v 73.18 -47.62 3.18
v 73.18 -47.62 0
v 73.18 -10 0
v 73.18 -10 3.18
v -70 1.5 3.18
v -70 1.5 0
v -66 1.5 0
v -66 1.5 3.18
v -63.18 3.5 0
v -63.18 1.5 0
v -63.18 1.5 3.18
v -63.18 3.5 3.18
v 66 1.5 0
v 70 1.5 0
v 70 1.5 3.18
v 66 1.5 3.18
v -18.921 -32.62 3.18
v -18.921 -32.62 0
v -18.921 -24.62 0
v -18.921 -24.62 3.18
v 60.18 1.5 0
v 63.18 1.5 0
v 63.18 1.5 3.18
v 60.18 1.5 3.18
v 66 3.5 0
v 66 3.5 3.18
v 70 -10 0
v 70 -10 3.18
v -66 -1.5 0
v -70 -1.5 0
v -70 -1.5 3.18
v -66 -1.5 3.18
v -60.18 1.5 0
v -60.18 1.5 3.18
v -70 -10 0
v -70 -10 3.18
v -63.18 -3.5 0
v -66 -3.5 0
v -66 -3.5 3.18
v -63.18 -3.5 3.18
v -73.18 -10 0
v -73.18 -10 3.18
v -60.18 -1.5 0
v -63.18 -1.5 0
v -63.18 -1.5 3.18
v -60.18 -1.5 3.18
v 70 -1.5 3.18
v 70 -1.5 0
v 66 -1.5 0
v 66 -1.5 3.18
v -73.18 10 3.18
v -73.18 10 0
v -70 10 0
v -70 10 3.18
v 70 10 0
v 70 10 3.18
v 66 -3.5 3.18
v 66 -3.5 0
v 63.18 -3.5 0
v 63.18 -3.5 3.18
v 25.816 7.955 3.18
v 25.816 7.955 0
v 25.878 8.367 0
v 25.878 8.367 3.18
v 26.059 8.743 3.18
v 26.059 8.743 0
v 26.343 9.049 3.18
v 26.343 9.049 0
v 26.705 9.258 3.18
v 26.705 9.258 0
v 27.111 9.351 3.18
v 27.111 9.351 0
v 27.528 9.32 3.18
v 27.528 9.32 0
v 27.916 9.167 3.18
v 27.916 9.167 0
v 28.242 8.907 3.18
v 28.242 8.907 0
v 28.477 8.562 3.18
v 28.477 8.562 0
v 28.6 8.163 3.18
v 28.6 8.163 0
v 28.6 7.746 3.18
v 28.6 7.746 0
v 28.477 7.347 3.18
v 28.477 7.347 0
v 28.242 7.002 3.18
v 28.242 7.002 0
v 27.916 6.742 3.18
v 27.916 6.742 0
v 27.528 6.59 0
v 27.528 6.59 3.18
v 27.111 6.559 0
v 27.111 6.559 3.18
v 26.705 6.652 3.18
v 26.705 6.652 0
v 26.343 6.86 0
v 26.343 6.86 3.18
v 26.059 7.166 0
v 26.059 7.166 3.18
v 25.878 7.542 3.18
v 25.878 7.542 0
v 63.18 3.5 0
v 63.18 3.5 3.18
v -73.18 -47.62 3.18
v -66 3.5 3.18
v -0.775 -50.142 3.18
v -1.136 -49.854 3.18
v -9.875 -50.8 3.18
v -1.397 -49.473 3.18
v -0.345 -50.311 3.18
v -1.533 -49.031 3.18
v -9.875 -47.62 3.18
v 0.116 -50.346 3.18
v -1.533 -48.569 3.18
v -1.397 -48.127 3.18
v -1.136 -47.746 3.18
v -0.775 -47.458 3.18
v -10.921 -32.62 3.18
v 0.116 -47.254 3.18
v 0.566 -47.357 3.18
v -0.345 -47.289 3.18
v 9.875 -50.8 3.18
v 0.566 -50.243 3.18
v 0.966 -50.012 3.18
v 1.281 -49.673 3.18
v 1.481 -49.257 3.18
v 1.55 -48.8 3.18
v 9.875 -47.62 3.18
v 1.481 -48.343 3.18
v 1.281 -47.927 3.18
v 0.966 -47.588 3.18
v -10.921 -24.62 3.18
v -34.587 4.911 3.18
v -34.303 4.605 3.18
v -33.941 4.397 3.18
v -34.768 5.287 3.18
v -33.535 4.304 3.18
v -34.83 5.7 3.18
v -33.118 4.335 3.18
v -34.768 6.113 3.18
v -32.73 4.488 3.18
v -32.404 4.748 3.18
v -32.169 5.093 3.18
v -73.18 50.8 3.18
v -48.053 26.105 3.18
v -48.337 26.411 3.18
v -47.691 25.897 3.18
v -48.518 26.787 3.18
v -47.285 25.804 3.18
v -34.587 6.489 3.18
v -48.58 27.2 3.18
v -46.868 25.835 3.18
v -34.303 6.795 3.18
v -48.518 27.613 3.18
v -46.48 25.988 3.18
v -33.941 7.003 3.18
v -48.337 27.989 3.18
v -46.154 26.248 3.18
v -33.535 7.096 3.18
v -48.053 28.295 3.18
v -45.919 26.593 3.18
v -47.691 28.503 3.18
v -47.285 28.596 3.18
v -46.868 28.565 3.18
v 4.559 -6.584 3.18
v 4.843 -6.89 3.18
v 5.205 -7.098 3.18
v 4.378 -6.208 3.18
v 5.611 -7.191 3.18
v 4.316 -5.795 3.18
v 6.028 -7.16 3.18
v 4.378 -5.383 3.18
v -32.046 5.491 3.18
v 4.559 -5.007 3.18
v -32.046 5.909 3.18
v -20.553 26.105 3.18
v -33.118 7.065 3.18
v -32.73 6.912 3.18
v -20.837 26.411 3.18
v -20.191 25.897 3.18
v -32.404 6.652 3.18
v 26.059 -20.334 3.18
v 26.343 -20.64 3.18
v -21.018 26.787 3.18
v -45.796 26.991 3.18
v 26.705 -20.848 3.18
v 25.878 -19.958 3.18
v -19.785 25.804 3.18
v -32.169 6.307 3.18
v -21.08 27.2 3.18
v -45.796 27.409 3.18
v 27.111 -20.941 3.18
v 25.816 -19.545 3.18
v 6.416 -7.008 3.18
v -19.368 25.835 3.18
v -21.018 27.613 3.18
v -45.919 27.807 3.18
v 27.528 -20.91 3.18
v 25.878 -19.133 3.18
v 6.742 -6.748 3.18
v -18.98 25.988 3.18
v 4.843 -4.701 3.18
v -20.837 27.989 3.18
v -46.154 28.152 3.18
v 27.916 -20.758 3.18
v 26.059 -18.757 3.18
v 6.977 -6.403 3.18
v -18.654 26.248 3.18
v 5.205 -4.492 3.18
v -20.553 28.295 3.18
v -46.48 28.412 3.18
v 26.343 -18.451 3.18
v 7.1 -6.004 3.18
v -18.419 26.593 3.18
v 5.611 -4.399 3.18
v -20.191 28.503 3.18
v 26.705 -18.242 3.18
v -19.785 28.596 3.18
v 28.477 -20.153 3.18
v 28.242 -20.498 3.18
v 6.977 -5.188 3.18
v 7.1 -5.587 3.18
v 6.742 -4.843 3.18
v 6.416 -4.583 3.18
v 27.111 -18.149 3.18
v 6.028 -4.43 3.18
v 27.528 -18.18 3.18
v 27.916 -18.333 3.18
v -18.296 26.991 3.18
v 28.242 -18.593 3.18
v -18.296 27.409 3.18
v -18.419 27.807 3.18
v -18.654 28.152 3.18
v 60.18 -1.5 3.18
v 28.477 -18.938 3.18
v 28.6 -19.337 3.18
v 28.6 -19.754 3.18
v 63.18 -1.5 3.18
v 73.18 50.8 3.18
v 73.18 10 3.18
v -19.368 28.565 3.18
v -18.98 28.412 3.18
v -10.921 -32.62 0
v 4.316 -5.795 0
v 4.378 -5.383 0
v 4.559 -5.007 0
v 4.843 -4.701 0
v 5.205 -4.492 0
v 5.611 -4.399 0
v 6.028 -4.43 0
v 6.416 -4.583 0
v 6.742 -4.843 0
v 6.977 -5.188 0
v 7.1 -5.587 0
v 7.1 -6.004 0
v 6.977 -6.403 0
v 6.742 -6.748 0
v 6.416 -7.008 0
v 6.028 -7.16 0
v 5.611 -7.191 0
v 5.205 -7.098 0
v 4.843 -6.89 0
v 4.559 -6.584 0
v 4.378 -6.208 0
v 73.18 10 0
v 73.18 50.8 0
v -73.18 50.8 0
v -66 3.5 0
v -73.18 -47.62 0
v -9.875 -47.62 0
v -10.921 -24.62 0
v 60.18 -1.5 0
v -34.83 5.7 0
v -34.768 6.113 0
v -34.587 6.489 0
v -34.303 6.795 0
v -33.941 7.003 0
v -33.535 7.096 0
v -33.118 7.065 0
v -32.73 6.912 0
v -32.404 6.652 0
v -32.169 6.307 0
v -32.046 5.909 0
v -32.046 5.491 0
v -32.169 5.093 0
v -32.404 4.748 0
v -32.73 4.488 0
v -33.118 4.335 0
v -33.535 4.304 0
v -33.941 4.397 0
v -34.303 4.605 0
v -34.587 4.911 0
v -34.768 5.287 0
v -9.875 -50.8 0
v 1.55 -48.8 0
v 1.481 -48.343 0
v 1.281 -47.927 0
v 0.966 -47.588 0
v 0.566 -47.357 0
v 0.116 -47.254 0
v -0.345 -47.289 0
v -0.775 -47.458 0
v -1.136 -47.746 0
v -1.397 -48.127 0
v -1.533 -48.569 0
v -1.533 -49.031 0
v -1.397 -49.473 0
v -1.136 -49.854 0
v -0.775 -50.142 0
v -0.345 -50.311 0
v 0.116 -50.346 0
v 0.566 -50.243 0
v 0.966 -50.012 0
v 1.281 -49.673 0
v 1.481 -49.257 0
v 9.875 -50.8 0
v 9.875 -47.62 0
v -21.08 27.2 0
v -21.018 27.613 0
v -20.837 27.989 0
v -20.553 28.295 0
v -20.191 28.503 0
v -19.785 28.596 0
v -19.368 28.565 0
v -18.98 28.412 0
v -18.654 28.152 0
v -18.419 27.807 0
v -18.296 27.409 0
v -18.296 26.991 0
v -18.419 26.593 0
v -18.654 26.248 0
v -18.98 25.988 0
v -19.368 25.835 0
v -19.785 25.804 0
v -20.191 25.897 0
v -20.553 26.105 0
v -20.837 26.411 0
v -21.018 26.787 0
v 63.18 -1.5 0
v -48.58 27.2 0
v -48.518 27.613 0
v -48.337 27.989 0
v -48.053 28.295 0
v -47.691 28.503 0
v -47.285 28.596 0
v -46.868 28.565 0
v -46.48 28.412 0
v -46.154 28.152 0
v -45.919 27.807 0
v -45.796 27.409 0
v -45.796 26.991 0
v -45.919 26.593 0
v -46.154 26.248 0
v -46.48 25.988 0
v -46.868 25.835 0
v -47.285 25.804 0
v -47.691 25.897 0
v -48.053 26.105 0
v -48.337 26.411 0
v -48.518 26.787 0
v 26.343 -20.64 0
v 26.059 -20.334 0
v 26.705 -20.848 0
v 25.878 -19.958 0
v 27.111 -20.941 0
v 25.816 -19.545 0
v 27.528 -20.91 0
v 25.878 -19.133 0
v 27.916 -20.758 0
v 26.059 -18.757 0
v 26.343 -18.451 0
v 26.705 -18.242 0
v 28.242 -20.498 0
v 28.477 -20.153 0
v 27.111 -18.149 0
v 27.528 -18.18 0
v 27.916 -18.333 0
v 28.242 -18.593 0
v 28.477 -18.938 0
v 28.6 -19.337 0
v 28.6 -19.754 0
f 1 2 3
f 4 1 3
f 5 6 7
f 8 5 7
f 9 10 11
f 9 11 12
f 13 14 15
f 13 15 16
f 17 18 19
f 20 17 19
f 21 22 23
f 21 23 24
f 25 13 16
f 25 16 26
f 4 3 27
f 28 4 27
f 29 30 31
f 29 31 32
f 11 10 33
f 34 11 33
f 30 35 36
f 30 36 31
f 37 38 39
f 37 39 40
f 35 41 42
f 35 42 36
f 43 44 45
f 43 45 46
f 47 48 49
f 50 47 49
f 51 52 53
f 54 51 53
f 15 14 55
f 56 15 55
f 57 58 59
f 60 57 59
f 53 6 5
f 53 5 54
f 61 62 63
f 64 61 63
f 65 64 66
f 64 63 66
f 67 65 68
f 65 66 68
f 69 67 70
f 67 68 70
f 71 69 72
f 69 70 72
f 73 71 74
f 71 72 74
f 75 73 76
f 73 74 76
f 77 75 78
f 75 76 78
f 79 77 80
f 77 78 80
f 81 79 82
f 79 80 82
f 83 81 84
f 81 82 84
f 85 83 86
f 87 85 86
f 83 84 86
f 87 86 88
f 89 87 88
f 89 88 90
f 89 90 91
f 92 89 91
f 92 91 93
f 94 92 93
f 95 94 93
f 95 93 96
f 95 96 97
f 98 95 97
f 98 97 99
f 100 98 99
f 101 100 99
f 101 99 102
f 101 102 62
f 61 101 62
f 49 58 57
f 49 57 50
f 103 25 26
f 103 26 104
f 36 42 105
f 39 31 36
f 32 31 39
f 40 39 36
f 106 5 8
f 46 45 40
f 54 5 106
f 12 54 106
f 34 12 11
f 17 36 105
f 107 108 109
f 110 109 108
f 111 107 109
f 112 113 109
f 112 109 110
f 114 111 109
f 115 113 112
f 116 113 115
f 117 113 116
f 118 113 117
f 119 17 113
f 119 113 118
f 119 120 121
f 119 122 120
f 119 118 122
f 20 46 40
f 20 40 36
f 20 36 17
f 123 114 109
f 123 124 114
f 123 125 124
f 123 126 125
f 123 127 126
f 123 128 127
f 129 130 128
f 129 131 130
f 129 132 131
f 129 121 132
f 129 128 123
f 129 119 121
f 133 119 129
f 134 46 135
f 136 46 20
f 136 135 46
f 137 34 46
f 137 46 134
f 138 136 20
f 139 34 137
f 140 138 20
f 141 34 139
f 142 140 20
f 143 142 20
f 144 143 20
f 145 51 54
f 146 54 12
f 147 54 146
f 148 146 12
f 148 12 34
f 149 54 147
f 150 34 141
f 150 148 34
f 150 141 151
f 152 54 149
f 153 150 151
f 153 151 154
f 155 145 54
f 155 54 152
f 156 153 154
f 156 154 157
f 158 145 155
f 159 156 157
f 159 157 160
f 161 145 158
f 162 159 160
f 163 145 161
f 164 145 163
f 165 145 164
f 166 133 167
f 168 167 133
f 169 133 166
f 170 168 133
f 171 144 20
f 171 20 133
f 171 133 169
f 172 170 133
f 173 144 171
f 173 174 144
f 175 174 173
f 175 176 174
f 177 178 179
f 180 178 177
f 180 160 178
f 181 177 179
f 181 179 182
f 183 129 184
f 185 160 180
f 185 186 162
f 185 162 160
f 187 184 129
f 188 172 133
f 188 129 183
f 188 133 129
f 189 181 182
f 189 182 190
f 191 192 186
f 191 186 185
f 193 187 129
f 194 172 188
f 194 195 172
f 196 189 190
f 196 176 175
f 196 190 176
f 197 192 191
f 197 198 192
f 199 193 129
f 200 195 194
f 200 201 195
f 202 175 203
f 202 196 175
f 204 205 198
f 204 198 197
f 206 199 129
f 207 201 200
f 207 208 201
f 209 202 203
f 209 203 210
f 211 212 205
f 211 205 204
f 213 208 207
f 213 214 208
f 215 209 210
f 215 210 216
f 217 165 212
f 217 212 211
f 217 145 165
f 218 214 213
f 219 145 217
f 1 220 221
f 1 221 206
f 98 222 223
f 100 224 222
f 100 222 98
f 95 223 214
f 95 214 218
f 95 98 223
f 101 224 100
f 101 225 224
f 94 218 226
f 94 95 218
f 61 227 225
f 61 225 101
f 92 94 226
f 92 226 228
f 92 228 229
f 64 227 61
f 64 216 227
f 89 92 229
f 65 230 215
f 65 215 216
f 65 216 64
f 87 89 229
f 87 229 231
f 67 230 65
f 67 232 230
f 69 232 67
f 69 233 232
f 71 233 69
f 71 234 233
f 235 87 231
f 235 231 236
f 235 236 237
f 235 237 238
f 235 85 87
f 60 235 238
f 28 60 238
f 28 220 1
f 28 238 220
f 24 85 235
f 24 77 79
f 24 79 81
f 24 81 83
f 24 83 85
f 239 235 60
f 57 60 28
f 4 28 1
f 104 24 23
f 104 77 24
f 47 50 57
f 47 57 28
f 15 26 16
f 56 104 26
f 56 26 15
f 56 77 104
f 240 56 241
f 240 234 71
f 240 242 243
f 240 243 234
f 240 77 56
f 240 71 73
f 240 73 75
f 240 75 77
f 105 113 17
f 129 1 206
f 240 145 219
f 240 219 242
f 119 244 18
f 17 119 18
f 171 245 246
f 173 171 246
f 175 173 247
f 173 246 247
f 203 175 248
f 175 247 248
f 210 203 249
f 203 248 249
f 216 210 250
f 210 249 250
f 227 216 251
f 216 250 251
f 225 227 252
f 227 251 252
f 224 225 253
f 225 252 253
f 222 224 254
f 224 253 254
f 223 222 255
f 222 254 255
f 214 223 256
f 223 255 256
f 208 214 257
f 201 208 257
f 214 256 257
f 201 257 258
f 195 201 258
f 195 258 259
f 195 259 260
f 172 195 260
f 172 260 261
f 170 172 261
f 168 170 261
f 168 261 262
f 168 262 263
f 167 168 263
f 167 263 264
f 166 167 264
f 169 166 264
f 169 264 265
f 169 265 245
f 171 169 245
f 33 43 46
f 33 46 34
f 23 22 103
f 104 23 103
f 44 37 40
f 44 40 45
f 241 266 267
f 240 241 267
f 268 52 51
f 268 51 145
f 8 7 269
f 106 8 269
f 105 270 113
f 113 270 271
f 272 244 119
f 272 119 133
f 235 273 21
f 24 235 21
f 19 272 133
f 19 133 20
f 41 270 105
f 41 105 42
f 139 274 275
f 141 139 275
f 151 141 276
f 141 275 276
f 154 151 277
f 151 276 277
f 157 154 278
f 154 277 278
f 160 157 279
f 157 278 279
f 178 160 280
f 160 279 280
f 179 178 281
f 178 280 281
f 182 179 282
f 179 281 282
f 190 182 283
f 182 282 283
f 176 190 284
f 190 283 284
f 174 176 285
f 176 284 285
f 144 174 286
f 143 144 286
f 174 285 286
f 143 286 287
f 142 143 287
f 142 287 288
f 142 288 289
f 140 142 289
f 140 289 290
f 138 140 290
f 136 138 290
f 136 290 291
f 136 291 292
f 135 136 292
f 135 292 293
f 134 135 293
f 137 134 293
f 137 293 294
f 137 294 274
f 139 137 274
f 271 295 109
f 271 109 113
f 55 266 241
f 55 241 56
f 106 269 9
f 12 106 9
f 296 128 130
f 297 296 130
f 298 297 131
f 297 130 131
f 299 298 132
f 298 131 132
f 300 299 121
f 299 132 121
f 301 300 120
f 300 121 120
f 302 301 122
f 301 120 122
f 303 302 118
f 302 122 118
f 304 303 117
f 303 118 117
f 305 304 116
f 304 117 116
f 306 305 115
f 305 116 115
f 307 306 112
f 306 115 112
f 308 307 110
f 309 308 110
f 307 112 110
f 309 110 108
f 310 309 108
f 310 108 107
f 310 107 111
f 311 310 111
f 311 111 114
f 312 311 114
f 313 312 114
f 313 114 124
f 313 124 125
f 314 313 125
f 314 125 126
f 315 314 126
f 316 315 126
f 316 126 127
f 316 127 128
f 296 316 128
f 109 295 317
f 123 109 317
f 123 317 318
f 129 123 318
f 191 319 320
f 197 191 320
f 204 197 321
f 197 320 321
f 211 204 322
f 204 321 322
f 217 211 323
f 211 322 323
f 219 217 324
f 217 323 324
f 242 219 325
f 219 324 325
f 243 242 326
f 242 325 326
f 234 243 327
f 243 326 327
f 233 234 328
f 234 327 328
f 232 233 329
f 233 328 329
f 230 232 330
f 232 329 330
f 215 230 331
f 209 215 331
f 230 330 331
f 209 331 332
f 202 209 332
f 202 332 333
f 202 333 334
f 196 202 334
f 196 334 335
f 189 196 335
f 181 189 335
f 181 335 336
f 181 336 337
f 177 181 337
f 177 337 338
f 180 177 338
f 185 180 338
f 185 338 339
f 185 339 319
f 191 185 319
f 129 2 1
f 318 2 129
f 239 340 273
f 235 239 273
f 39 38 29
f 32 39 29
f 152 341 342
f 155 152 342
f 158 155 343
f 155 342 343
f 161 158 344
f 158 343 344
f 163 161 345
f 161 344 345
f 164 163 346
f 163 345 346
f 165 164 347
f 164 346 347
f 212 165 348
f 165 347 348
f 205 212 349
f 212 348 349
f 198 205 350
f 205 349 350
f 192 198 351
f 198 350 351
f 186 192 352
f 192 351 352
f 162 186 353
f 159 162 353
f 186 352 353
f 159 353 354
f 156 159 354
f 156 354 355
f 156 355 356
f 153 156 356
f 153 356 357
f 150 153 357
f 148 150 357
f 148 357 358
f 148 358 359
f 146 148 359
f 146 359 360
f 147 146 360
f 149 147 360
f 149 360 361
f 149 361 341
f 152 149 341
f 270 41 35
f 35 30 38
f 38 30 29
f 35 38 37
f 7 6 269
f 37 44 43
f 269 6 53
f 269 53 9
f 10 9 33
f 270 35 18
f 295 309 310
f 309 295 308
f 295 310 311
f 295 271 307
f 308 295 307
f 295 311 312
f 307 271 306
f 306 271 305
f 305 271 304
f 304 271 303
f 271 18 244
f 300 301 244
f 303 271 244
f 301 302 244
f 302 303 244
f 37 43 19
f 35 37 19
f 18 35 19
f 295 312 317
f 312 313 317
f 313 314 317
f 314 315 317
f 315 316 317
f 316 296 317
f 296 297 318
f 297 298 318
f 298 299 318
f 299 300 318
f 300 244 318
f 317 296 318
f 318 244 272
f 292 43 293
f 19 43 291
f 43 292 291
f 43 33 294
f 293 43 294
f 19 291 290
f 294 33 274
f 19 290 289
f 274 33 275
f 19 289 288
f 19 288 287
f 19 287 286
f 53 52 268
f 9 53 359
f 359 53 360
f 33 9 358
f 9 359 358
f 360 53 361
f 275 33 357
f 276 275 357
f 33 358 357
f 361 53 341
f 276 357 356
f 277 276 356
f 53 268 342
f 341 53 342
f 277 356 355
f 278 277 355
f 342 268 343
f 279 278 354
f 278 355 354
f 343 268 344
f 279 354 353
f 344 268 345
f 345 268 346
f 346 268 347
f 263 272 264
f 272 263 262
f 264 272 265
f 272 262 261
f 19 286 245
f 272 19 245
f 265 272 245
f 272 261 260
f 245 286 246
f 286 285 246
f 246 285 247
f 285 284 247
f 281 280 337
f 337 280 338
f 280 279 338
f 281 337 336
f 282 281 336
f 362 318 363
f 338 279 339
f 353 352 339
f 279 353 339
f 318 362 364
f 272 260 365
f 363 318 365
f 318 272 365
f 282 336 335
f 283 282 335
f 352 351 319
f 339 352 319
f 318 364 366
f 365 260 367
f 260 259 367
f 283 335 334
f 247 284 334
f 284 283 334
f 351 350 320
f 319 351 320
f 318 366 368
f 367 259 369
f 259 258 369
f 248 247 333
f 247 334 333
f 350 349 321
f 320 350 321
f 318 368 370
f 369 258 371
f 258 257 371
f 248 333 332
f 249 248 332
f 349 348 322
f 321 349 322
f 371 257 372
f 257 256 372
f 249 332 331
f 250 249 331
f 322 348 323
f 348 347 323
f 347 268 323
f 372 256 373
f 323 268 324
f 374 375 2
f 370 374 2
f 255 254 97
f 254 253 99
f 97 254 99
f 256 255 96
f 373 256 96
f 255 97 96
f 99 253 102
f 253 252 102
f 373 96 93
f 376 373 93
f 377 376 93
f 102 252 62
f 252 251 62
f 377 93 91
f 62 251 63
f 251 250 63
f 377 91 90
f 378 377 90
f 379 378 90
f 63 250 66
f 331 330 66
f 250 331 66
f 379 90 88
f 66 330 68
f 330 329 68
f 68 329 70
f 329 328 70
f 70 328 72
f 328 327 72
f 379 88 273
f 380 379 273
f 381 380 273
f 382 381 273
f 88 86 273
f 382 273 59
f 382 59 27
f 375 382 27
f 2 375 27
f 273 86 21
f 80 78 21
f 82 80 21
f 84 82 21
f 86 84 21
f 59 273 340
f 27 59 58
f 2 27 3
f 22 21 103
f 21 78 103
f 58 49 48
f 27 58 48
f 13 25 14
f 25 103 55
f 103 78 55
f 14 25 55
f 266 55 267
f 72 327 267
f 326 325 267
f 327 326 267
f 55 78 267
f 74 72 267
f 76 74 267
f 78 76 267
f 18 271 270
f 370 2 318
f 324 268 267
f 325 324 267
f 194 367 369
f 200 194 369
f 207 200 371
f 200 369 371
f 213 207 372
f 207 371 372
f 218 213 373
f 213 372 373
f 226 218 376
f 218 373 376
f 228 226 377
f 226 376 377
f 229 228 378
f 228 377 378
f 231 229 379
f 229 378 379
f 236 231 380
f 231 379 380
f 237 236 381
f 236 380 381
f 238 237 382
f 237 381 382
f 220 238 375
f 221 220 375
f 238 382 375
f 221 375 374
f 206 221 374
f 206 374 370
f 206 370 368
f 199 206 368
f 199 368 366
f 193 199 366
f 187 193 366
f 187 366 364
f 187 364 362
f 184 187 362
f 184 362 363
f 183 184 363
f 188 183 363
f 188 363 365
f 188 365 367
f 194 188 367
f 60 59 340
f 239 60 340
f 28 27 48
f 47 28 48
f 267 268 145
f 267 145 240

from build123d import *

# Parameters (mm, degrees)
SKETCH1_W               = 146.36
SKETCH1_H               = 101.6
BOSS_EXTRUDE1_DEPTH     = 3.18
CUT_EXTRUDE1_START      = -4.18
SKETCH2_W               = 3.18
SKETCH2_H               = 20
SKETCH2_W_2             = 13
SKETCH2_H_2             = 3
SKETCH2_W_3             = 2.82
SKETCH2_H_3             = 7
CUT_EXTRUDE1_DEPTH      = 5.18
CUT_EXTRUDE2_START      = -4.18
SKETCH3_W               = 63.305
SKETCH3_H               = 3.18
CUT_EXTRUDE2_DEPTH      = 5.18
SKETCH4_R               = 1.55
CUT_EXTRUDE3_DEPTH      = 1
CUT_EXTRUDE3_DEPTH_BACK = 4.18
SKETCH9_W               = 8
SKETCH9_H               = 8
CUT_EXTRUDE7_DEPTH      = 1
CUT_EXTRUDE7_DEPTH_BACK = 4.18
SKETCH8_R               = 1.4
CUT_EXTRUDE8_DEPTH      = 1
CUT_EXTRUDE8_DEPTH_BACK = 4.18
SKETCH12_R              = 1.4
CUT_EXTRUDE9_DEPTH      = 1
CUT_EXTRUDE9_DEPTH_BACK = 4.18


with BuildPart() as part:
    # Sketch1 → Boss-Extrude1 (new body)
    with BuildSketch(Plane.XY):
        Rectangle(SKETCH1_W, SKETCH1_H)
    extrude(amount=BOSS_EXTRUDE1_DEPTH)

    # Sketch2 → Cut-Extrude1 (cut)
    with BuildSketch(Plane.XY.offset(3.18).offset(CUT_EXTRUDE1_START)):
        with Locations((-71.59, 0)):
            Rectangle(SKETCH2_W, SKETCH2_H)
        with Locations((-66.68, 0)):
            Rectangle(SKETCH2_W_2, SKETCH2_H_2)
        with Locations((-64.59, 0)):
            Rectangle(SKETCH2_W_3, SKETCH2_H_3)
    cut_extrude1 = extrude(amount=CUT_EXTRUDE1_DEPTH, mode=Mode.SUBTRACT)

    # Mirror1: Cut-Extrude1 across plane
    add(cut_extrude1.mirror(Plane(origin=(0, 0, 0), x_dir=(0, 0, 1), z_dir=(1, 0, 0))), mode=Mode.SUBTRACT)

    # Sketch3 → Cut-Extrude2 (cut)
    with BuildSketch(Plane.XY.offset(3.18).offset(CUT_EXTRUDE2_START)):
        with Locations((-41.5275, -49.21)):
            Rectangle(SKETCH3_W, SKETCH3_H)
    cut_extrude2 = extrude(amount=CUT_EXTRUDE2_DEPTH, mode=Mode.SUBTRACT)

    # Mirror2: Cut-Extrude2 across plane
    add(cut_extrude2.mirror(Plane(origin=(0, 0, 0), x_dir=(0, 0, 1), z_dir=(1, 0, 0))), mode=Mode.SUBTRACT)

    # Sketch4 → Cut-Extrude3 (cut, two sides)
    with BuildSketch(Plane.XY.offset(3.18)) as cut_extrude3_sk:
        with Locations((0, -48.8)):
            Circle(SKETCH4_R)
    extrude(amount=CUT_EXTRUDE3_DEPTH, mode=Mode.SUBTRACT)
    extrude(cut_extrude3_sk.sketch, amount=-CUT_EXTRUDE3_DEPTH_BACK, mode=Mode.SUBTRACT)

    # Sketch9 → Cut-Extrude7 (cut, two sides)
    with BuildSketch(Plane(origin=(0, 0, 0), x_dir=(-1, 0, 0), z_dir=(0, 0, -1))) as cut_extrude7_sk:
        with Locations((14.920568418, -28.62)):
            Rectangle(SKETCH9_W, SKETCH9_H)
    extrude(amount=CUT_EXTRUDE7_DEPTH, mode=Mode.SUBTRACT)
    extrude(cut_extrude7_sk.sketch, amount=-CUT_EXTRUDE7_DEPTH_BACK, mode=Mode.SUBTRACT)

    # Sketch8 → Cut-Extrude8 (cut, two sides)
    with BuildSketch(Plane(origin=(0, 0, 0), x_dir=(-1, 0, 0), z_dir=(0, 0, -1))) as cut_extrude8_sk:
        with Locations((-5.716117592, -5.795275692)):
            Circle(SKETCH8_R)
        with Locations((-27.216117592, 7.954724308)):
            Circle(SKETCH8_R)
        with Locations((-27.216117592, -19.545275692)):
            Circle(SKETCH8_R)
    extrude(amount=CUT_EXTRUDE8_DEPTH, mode=Mode.SUBTRACT)
    extrude(cut_extrude8_sk.sketch, amount=-CUT_EXTRUDE8_DEPTH_BACK, mode=Mode.SUBTRACT)

    # Sketch12 → Cut-Extrude9 (cut, two sides)
    with BuildSketch(Plane(origin=(0, 0, 0), x_dir=(-1, 0, 0), z_dir=(0, 0, -1))) as cut_extrude9_sk:
        with Locations((19.68, 27.2)):
            Circle(SKETCH12_R)
        with Locations((33.43, 5.7)):
            Circle(SKETCH12_R)
        with Locations((47.18, 27.2)):
            Circle(SKETCH12_R)
    extrude(amount=CUT_EXTRUDE9_DEPTH, mode=Mode.SUBTRACT)
    extrude(cut_extrude9_sk.sketch, amount=-CUT_EXTRUDE9_DEPTH_BACK, mode=Mode.SUBTRACT)


solid = part.part
